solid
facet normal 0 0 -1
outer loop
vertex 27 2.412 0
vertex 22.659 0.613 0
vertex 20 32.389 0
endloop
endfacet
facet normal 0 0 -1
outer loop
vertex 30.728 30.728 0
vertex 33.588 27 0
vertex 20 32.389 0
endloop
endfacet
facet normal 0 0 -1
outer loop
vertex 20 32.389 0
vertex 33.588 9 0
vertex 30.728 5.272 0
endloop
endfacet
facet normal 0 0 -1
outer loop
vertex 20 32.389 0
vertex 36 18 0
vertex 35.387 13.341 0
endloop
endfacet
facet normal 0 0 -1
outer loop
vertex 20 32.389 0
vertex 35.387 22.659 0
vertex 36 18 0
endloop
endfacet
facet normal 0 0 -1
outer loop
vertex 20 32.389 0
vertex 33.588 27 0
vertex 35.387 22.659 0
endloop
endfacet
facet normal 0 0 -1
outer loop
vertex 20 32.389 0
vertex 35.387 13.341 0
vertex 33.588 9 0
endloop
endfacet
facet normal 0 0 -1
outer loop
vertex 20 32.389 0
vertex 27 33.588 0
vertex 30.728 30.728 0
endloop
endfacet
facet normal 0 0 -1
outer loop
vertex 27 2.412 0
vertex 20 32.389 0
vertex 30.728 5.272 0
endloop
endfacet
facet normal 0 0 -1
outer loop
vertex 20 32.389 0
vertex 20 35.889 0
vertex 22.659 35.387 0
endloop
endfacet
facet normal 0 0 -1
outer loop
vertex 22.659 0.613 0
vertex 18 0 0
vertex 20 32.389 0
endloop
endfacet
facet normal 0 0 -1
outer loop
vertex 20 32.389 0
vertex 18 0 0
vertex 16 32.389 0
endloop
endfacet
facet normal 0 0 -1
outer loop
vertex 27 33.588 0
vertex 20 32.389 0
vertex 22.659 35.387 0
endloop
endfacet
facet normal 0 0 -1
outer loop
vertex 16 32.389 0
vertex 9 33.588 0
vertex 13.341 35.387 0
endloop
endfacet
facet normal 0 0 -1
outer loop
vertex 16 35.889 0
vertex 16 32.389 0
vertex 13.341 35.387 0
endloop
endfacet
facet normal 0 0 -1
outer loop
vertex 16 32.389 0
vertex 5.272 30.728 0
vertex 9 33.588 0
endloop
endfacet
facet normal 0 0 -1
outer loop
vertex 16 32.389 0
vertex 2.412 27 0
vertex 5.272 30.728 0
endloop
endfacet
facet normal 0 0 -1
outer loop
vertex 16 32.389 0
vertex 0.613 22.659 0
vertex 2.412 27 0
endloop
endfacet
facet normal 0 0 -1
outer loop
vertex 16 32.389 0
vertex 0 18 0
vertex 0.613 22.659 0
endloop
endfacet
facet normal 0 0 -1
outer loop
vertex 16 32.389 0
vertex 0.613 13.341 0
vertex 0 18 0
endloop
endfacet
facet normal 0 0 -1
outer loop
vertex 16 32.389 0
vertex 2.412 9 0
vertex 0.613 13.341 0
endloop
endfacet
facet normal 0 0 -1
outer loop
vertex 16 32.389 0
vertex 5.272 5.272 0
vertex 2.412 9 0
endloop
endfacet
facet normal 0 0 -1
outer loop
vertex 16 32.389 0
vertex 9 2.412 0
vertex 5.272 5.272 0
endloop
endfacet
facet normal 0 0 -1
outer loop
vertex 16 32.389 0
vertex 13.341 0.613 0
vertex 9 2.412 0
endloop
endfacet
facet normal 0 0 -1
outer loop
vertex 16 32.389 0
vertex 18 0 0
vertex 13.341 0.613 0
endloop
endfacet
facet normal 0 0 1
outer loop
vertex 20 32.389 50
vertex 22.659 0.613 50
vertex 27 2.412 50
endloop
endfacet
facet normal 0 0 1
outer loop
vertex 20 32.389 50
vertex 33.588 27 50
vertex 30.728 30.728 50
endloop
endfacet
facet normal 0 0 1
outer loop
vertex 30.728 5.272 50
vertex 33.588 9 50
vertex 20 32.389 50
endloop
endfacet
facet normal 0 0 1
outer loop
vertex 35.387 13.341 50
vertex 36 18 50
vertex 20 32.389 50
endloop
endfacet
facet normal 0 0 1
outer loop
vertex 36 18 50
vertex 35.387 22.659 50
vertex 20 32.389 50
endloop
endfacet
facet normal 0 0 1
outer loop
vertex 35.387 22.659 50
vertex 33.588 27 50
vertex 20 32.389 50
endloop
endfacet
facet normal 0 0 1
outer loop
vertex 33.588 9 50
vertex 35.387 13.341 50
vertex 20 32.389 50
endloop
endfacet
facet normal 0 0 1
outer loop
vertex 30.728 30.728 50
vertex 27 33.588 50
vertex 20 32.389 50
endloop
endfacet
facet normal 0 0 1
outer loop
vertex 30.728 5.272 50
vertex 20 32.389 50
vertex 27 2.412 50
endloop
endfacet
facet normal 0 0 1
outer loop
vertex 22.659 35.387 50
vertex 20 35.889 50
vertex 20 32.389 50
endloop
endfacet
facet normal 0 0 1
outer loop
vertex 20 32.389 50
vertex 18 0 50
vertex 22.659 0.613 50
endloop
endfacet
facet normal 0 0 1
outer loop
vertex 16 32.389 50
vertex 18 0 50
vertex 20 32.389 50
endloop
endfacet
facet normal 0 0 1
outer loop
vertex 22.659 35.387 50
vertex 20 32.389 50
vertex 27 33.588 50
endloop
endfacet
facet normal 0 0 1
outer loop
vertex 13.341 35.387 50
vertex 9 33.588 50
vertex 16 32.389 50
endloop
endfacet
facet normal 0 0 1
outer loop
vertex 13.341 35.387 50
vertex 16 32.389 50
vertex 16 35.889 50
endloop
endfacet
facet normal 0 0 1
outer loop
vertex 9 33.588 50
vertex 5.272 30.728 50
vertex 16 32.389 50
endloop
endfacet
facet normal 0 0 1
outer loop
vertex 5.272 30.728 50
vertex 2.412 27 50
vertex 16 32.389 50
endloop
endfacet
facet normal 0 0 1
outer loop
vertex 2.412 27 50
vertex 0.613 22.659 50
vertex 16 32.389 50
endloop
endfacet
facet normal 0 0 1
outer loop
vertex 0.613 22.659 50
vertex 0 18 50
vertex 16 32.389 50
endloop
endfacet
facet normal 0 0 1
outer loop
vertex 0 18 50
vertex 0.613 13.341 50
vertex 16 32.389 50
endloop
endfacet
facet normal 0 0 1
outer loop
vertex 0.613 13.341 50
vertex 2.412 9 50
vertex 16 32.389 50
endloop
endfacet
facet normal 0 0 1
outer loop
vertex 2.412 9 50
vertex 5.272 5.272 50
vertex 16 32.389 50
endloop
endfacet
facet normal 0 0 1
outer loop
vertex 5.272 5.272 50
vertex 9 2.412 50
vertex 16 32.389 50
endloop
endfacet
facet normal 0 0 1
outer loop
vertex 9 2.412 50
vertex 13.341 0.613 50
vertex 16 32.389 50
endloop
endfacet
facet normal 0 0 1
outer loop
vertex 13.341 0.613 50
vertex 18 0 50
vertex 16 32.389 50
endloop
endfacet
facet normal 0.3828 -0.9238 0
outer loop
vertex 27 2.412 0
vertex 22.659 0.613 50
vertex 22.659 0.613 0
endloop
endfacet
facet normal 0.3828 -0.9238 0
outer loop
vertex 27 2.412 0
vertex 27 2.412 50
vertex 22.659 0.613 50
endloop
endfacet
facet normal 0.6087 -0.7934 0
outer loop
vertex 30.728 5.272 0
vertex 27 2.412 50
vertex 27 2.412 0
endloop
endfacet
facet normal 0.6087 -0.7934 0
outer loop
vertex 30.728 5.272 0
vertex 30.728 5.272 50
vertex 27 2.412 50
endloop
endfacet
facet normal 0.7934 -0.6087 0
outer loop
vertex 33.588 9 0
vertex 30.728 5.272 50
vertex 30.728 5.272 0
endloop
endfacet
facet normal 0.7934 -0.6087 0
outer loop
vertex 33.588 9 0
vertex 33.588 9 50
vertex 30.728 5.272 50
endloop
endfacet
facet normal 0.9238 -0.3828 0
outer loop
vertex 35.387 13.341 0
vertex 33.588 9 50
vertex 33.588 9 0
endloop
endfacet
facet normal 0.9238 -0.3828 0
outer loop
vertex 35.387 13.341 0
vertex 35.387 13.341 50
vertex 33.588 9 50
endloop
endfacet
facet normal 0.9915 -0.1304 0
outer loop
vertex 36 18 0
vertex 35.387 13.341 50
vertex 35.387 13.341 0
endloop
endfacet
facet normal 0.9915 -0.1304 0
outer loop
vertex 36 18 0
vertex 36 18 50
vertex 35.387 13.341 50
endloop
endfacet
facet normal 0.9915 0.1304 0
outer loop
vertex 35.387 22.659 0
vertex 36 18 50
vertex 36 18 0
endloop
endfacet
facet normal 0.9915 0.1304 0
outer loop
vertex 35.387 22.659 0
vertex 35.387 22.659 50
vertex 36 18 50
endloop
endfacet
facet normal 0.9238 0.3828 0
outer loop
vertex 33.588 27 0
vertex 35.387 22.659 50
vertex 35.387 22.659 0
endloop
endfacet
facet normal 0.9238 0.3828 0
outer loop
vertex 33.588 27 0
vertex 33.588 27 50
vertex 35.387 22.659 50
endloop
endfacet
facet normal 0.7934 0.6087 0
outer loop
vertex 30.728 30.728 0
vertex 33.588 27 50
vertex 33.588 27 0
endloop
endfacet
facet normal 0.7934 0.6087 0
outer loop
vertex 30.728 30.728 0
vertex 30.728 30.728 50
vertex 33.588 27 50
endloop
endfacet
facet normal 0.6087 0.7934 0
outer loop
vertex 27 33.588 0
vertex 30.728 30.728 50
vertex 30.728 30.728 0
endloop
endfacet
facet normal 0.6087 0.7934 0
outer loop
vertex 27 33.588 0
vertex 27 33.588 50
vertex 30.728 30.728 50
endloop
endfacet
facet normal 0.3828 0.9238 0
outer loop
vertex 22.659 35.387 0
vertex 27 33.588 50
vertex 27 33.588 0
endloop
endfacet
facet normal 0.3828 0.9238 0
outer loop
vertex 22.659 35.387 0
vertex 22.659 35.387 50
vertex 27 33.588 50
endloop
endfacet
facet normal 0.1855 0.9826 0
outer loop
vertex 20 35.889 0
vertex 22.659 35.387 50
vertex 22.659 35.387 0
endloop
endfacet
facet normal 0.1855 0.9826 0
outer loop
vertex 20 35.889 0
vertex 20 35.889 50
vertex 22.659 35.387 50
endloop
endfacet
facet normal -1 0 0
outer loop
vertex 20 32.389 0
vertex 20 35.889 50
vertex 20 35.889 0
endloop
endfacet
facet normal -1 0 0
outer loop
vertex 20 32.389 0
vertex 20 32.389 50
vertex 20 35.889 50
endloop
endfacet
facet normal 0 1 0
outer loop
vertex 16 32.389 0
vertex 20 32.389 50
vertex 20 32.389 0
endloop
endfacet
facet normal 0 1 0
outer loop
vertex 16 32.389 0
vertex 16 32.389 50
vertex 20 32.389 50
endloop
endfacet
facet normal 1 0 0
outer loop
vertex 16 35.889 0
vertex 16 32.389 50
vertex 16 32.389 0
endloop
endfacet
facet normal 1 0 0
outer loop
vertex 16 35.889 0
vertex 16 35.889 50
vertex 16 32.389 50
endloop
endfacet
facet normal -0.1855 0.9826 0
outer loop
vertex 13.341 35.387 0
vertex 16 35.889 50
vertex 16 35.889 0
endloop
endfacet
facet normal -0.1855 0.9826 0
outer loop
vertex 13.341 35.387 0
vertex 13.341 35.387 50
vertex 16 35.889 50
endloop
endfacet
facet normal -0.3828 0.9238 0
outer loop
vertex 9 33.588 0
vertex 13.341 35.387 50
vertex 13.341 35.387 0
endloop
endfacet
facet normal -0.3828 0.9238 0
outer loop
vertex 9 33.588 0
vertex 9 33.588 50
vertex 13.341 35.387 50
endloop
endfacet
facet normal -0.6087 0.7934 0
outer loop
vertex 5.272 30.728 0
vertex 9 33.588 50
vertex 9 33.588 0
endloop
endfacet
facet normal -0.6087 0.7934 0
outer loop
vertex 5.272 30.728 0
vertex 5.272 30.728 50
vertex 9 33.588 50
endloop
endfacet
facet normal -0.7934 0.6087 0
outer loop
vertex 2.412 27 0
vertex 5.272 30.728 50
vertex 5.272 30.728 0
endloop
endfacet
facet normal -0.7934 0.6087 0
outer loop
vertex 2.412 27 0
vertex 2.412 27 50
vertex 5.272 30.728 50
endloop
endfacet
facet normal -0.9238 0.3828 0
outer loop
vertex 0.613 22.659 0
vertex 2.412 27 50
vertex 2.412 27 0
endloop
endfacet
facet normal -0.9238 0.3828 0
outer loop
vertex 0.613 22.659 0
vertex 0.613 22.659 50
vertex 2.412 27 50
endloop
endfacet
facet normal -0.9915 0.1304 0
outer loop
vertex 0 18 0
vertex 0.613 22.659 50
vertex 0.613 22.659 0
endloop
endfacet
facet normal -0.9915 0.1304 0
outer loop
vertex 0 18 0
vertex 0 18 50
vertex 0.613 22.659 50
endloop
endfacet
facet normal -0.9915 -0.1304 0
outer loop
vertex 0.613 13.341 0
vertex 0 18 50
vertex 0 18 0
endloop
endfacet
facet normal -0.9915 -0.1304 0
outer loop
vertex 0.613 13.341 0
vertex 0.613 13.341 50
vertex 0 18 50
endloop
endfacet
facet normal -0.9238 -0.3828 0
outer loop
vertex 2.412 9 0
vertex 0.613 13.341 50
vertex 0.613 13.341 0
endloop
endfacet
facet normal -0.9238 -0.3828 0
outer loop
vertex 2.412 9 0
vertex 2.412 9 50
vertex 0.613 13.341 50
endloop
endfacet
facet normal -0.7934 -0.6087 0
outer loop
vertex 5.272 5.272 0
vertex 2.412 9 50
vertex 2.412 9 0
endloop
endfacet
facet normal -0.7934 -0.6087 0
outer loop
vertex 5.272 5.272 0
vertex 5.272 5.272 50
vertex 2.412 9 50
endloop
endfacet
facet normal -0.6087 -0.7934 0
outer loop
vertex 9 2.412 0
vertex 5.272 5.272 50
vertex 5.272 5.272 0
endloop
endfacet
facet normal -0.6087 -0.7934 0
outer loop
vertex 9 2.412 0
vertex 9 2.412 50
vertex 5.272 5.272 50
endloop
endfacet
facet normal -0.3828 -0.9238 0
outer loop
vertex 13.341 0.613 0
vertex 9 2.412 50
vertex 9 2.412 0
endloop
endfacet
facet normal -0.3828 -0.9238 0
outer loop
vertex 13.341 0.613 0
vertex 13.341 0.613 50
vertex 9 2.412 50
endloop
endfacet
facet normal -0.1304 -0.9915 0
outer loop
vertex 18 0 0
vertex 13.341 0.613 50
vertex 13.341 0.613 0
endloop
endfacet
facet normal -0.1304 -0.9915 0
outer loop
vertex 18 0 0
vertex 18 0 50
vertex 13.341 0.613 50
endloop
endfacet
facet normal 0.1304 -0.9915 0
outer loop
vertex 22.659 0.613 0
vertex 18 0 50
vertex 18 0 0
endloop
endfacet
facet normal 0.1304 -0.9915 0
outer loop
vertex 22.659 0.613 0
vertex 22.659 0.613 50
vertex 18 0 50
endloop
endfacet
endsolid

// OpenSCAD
$fn = 32;

// ----------------------------------------------------------------------
// Keyway shaft: d36 shaft, key 4 x 3.5 mm
// ----------------------------------------------------------------------

// --- parameters (mm) ---
shaft_r = 18;             // shaft radius
key_w = 4;                // keyway width
key_d = 3.5;              // keyway depth below the surface line
plate_t = 50;             // shaft length, Z (extrusion height)

shaft_d = 2 * shaft_r;  // shaft diameter
circle_step = 15;  // polygon sampling step, degrees

profile = [[13.341, 35.387], [9, 33.588], [5.272, 30.728], [2.412, 27], [0.613, 22.659], [0, 18], [0.613, 13.341], [2.412, 9], [5.272, 5.272], [9, 2.412], [13.341, 0.613], [18, 0], [22.659, 0.613], [27, 2.412], [30.728, 5.272], [33.588, 9], [35.387, 13.341], [36, 18], [35.387, 22.659], [33.588, 27], [30.728, 30.728], [27, 33.588], [22.659, 35.387], [20, 35.889], [20, 32.389], [16, 32.389], [16, 35.889]];  // primary outline, 27 points, counter clockwise

// --- the one profile operation ---
linear_extrude(height = plate_t) polygon(points = profile);
